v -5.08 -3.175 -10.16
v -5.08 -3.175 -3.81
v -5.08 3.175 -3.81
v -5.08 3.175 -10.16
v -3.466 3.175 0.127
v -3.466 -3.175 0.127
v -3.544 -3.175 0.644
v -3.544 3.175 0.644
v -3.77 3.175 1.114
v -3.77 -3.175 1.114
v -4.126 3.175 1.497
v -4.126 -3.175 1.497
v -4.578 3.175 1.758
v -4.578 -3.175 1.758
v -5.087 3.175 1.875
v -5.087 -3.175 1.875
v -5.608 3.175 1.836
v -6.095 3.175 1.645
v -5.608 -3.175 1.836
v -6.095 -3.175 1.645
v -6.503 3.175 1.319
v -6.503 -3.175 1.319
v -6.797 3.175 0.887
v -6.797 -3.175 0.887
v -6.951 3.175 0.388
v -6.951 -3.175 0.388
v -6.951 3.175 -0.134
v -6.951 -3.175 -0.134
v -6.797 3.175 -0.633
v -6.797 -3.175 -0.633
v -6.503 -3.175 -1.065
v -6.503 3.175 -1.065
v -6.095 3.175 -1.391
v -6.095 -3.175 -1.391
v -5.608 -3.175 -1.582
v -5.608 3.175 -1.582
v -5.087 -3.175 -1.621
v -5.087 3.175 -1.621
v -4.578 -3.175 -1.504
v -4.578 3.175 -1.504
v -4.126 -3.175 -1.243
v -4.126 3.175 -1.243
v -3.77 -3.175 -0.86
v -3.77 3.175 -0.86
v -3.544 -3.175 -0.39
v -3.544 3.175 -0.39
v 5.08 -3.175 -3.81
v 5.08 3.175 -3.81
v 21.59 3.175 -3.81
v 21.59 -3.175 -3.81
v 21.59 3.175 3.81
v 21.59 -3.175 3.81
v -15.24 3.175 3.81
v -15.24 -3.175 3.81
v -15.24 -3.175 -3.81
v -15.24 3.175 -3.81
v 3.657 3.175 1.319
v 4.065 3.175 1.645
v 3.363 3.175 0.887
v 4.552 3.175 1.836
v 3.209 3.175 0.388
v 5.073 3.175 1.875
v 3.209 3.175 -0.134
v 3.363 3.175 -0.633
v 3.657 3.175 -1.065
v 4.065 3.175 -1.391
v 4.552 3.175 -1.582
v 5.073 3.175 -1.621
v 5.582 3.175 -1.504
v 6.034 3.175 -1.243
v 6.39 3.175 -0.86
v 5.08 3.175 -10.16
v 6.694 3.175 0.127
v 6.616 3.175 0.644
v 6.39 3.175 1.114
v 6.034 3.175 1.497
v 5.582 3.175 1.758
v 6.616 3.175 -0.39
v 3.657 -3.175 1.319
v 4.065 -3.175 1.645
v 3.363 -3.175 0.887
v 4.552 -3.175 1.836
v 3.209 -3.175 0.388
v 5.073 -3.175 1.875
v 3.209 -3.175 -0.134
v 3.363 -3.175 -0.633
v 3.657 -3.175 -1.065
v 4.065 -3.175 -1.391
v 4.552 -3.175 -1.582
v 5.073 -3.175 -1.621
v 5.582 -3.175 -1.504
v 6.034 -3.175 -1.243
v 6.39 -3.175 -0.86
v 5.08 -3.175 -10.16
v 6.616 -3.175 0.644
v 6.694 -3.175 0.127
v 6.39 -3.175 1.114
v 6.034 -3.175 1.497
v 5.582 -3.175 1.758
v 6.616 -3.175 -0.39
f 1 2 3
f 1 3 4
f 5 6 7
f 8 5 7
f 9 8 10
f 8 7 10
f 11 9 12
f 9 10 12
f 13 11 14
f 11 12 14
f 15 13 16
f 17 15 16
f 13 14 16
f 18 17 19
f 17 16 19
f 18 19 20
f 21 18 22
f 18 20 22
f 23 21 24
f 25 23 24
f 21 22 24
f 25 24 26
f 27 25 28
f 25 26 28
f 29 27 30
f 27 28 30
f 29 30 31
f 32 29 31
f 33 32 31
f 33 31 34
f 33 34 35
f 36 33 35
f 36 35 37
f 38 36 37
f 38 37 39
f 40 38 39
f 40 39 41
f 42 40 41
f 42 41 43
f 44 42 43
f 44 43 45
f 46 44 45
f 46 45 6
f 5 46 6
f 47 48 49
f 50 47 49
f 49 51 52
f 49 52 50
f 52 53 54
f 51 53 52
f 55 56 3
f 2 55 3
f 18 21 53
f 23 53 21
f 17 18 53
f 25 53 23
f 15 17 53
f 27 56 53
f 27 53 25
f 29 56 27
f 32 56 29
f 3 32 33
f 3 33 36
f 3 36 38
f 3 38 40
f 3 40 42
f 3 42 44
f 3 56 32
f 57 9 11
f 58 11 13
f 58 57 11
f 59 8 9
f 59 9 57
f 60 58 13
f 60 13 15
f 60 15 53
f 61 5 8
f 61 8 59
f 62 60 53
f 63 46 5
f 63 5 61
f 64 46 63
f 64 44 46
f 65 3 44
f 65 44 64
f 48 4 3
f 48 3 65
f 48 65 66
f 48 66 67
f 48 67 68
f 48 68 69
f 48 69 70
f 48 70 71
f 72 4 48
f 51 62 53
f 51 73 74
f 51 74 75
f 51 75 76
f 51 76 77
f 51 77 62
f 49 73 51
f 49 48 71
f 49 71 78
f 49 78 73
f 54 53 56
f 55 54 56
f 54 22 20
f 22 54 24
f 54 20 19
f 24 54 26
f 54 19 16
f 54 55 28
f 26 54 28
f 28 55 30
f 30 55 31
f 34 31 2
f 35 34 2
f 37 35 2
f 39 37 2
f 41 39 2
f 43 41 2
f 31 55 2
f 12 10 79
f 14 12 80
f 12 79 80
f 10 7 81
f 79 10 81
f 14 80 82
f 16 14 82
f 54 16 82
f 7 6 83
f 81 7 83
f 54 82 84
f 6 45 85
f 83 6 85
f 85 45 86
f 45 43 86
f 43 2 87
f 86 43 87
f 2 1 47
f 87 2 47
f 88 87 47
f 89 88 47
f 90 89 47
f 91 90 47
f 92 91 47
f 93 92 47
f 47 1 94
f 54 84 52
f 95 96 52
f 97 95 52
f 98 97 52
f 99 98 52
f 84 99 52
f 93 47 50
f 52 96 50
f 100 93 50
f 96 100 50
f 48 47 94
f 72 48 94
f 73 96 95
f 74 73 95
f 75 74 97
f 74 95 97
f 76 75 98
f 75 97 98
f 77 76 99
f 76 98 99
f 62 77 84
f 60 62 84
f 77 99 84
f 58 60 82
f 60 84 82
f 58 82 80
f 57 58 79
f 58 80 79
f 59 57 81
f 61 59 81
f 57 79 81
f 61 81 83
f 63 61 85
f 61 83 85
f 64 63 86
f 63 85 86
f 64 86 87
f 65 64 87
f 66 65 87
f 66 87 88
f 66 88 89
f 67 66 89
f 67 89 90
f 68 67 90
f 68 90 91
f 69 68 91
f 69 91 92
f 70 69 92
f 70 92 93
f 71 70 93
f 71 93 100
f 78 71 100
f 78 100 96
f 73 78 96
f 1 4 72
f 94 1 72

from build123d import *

# Parameters (mm, degrees)
SKETCH1_W           = 30.48
SKETCH1_H           = 7.62
BOSS_EXTRUDE1_DEPTH = 3.175
SKETCH2_W           = 10.16
SKETCH2_H           = 6.35
BOSS_EXTRUDE2_DEPTH = 6.35
SKETCH3_W           = 6.35
SKETCH3_H           = 7.62
BOSS_EXTRUDE3_DEPTH = 6.35
SKETCH6_R           = 1.7526
CUT_EXTRUDE1_DEPTH  = 7.35


with BuildPart() as part:
    # Sketch1 → Boss-Extrude1 (new body, symmetric)
    with BuildSketch(Plane(origin=(0, 0, 0), x_dir=(1, 0, 0), z_dir=(0, 1, 0))):
        Rectangle(SKETCH1_W, SKETCH1_H)
    extrude(amount=BOSS_EXTRUDE1_DEPTH, both=True)

    # Sketch2 → Boss-Extrude2 (add)
    with BuildSketch(Plane(origin=(0, 3.175, 0), x_dir=(1, 0, 0), z_dir=(0, 1, 0))):
        with Locations((0, 6.985)):
            Rectangle(SKETCH2_W, SKETCH2_H)
    extrude(amount=-BOSS_EXTRUDE2_DEPTH)

    # Sketch3 → Boss-Extrude3 (add)
    with BuildSketch(Plane(origin=(0, 3.175, 0), x_dir=(1, 0, 0), z_dir=(0, 1, 0))):
        with Locations((18.415, 0)):
            Rectangle(SKETCH3_W, SKETCH3_H)
    extrude(amount=-BOSS_EXTRUDE3_DEPTH)

    # Sketch6 → Cut-Extrude1 (cut, through all)
    with BuildSketch(Plane.XZ.offset(3.175)):
        with Locations((4.941550795, 0.127)):
            Circle(SKETCH6_R)
        with Locations((-5.218449205, 0.127)):
            Circle(SKETCH6_R)
    extrude(amount=-CUT_EXTRUDE1_DEPTH, mode=Mode.SUBTRACT)


solid = part.part
